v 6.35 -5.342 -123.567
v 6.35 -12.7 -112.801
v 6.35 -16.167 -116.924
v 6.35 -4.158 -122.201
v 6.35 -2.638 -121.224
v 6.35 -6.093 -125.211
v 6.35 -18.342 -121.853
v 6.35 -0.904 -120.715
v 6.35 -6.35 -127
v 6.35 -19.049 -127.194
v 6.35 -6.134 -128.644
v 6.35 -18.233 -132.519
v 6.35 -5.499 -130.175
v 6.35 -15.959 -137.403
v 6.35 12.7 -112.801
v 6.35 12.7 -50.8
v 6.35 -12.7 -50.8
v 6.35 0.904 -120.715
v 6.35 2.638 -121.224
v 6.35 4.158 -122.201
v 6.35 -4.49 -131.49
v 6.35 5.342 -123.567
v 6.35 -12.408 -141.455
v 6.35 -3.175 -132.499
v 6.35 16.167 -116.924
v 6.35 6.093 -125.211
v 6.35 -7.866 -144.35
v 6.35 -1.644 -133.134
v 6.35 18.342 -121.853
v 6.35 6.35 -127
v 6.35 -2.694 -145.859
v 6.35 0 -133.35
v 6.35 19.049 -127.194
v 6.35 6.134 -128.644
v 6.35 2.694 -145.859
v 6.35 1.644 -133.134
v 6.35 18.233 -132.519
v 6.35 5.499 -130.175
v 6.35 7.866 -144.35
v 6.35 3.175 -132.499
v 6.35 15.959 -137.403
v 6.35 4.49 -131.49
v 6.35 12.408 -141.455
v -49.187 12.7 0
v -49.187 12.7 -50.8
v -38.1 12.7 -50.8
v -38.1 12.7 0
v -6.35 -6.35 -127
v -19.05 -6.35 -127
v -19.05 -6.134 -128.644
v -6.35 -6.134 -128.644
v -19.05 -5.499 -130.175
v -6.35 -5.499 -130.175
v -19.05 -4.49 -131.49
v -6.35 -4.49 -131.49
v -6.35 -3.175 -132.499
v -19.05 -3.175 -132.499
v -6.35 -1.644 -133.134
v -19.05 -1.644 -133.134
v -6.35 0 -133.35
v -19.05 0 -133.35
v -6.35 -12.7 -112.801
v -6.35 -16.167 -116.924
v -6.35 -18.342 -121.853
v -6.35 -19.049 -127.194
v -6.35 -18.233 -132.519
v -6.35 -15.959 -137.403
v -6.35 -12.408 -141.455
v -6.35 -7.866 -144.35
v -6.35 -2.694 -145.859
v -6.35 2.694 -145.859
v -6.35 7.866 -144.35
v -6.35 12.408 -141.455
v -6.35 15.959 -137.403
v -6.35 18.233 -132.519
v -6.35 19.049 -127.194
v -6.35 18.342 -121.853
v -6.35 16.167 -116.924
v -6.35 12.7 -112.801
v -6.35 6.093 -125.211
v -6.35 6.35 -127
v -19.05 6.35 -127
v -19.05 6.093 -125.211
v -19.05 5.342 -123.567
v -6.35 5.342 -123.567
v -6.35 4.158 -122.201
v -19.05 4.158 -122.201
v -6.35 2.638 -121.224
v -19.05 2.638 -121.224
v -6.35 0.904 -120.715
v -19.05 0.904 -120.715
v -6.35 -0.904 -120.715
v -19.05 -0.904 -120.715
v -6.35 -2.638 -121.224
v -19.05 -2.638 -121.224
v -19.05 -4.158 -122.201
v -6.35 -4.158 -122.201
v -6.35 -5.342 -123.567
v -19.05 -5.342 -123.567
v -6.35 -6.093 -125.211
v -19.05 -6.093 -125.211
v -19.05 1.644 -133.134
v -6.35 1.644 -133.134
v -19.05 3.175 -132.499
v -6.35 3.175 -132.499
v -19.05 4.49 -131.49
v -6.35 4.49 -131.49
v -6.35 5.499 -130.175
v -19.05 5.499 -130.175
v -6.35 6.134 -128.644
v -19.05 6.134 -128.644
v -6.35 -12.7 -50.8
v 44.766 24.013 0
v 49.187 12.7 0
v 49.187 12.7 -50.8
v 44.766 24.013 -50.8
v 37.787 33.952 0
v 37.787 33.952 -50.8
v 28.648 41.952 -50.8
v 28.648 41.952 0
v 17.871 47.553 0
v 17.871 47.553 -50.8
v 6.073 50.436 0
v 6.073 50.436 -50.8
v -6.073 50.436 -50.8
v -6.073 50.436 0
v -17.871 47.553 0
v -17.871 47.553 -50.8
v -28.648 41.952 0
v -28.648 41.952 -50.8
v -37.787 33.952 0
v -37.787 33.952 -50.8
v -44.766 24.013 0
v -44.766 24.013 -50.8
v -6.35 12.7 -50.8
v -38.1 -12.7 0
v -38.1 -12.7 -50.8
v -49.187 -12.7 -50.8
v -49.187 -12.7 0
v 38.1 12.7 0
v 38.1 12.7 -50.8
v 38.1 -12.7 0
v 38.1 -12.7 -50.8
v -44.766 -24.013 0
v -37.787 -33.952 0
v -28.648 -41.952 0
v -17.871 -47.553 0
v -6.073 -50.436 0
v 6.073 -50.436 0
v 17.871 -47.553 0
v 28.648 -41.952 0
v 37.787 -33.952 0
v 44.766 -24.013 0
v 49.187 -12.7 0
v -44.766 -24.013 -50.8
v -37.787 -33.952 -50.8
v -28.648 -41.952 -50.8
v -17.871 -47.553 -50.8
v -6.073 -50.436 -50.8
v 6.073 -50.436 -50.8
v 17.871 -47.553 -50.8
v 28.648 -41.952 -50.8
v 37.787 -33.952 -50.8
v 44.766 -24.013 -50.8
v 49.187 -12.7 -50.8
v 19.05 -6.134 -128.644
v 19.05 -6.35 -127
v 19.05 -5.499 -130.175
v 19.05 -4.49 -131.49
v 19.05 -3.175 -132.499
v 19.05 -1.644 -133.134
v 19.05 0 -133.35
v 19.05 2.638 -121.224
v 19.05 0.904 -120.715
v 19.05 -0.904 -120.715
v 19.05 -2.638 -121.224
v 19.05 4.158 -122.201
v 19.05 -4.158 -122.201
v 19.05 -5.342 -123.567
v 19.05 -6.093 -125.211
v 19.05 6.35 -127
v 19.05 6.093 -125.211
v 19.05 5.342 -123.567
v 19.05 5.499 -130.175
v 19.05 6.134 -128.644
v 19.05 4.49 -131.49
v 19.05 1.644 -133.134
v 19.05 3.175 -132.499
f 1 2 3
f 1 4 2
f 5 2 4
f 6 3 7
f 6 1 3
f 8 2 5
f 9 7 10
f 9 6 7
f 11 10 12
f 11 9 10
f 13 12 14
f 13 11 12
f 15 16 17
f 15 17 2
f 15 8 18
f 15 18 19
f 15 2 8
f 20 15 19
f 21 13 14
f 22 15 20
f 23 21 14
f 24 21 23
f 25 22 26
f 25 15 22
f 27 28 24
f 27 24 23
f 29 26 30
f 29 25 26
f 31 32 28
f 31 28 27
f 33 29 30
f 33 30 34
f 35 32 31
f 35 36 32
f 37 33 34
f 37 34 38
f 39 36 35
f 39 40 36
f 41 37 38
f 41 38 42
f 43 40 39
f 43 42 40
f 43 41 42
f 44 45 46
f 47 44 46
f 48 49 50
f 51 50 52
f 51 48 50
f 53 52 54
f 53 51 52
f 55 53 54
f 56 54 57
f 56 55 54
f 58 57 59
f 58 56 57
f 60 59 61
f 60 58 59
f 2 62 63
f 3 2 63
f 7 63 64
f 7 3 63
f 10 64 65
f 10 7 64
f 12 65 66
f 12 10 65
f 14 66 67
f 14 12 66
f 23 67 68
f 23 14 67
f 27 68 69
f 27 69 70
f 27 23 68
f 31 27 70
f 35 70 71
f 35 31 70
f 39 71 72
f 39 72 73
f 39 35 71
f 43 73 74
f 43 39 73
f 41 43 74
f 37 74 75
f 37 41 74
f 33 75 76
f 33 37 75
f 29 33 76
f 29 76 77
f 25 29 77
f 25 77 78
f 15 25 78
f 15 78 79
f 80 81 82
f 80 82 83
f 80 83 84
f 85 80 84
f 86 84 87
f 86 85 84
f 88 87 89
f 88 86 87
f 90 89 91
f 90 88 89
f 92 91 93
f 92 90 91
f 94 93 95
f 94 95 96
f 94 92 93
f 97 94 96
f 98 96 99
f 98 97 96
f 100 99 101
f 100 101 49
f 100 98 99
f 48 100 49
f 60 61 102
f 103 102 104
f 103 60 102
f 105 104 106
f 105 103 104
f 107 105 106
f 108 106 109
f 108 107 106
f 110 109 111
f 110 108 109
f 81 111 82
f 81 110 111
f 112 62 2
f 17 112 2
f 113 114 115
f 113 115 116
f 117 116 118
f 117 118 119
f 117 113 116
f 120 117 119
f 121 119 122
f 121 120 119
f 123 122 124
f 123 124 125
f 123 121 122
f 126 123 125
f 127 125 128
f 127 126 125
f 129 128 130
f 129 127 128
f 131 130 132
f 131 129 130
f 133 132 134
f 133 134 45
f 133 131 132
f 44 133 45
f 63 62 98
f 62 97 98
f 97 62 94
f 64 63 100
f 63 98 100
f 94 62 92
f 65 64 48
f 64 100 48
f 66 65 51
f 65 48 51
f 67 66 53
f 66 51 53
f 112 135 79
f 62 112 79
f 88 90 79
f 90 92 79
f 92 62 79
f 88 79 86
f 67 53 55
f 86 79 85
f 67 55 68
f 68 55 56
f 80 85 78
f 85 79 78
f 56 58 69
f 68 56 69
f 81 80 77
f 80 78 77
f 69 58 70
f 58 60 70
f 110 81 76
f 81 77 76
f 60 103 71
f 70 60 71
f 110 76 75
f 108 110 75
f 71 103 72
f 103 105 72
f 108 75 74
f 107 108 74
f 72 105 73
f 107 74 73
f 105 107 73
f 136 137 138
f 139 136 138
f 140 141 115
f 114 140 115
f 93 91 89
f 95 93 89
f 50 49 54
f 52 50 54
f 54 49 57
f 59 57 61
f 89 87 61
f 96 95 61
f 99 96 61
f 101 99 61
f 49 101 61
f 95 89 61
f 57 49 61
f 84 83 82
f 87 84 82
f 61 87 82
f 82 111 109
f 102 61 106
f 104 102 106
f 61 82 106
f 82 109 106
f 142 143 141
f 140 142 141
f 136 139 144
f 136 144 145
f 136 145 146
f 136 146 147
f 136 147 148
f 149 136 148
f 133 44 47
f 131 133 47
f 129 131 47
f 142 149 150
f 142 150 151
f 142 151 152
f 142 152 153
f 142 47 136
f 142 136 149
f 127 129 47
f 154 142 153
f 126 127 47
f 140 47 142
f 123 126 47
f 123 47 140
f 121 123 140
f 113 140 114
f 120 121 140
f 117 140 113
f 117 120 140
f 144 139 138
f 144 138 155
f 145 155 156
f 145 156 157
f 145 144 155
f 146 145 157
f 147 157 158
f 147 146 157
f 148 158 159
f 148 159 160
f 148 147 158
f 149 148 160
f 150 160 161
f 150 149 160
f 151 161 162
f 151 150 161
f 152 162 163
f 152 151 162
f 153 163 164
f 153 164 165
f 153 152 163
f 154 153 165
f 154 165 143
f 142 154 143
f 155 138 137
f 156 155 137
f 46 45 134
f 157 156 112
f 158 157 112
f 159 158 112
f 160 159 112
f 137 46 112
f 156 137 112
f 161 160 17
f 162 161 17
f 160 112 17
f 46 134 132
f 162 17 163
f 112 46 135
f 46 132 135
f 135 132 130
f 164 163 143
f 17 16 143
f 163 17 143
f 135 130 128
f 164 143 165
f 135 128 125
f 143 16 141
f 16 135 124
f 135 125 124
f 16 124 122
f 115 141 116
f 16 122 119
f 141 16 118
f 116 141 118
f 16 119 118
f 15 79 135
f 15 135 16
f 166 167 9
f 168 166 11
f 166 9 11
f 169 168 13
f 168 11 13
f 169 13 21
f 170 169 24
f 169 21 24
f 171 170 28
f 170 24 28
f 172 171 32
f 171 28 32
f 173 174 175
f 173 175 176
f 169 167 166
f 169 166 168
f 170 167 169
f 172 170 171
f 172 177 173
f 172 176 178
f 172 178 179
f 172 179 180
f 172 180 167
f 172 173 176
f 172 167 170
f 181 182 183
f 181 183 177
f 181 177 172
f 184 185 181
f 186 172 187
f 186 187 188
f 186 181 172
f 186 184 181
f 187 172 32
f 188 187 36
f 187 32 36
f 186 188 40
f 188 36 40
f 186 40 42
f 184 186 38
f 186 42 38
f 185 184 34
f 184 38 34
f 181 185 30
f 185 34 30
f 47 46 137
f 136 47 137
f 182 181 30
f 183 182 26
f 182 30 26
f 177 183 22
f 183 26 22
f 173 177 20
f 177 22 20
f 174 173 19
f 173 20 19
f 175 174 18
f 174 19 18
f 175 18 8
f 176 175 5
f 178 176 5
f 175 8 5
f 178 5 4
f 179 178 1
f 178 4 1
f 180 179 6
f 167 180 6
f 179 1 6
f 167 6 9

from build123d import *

# Parameters (mm, degrees)
SKETCH1_W           = 12.7
SKETCH1_H           = 25.4
BOSS_EXTRUDE1_DEPTH = 50.8
SKETCH1_3_W         = 12.7
SKETCH1_3_H         = 25.4
BOSS_EXTRUDE2_DEPTH = 127
SKETCH2_R           = 19.05
SKETCH2_R_2         = 6.35
BOSS_EXTRUDE3_DEPTH = 12.7
BOSS_EXTRUDE4_START = -6.35
SKETCH2_2_R         = 6.35
BOSS_EXTRUDE4_DEPTH = 19.05


with BuildPart() as part:
    # Sketch1 → Boss-Extrude1 (new body)
    with BuildSketch(Plane.XY):
        with BuildLine():
            Line((-38.1, -12.7), (-49.186888497, -12.7))
            ThreePointArc((-49.186888497, -12.7), (0, -50.8), (49.186888497, -12.7))
            Line((49.186888497, -12.7), (38.1, -12.7))
            Line((38.1, -12.7), (38.1, 12.7))
            Line((38.1, 12.7), (49.186888497, 12.7))
            ThreePointArc((49.186888497, 12.7), (0, 50.8), (-49.186888497, 12.7))
            Line((-49.186888497, 12.7), (-38.1, 12.7))
            Line((-38.1, 12.7), (-38.1, -12.7))
        make_face()
        Rectangle(SKETCH1_W, SKETCH1_H, mode=Mode.SUBTRACT)
    extrude(amount=-BOSS_EXTRUDE1_DEPTH)

    # Sketch1<3> → Boss-Extrude2 (add)
    with BuildSketch(Plane.XY):
        Rectangle(SKETCH1_3_W, SKETCH1_3_H)
    extrude(amount=-BOSS_EXTRUDE2_DEPTH)

    # Sketch2 → Boss-Extrude3 (add)
    with BuildSketch(Plane(origin=(6.35, 0, 0), x_dir=(0, 0, -1), z_dir=(1, 0, 0))):
        with Locations((127, 0)):
            Circle(SKETCH2_R)
        with Locations((127, 0)):
            Circle(SKETCH2_R_2, mode=Mode.SUBTRACT)
    extrude(amount=-BOSS_EXTRUDE3_DEPTH)

    # Sketch2<2> → Boss-Extrude4 (add, symmetric)
    with BuildSketch(Plane(origin=(6.35, 0, 0), x_dir=(0, 0, -1), z_dir=(1, 0, 0)).offset(BOSS_EXTRUDE4_START)):
        with Locations((127, 0)):
            Circle(SKETCH2_2_R)
    extrude(amount=BOSS_EXTRUDE4_DEPTH, both=True)


solid = part.part
